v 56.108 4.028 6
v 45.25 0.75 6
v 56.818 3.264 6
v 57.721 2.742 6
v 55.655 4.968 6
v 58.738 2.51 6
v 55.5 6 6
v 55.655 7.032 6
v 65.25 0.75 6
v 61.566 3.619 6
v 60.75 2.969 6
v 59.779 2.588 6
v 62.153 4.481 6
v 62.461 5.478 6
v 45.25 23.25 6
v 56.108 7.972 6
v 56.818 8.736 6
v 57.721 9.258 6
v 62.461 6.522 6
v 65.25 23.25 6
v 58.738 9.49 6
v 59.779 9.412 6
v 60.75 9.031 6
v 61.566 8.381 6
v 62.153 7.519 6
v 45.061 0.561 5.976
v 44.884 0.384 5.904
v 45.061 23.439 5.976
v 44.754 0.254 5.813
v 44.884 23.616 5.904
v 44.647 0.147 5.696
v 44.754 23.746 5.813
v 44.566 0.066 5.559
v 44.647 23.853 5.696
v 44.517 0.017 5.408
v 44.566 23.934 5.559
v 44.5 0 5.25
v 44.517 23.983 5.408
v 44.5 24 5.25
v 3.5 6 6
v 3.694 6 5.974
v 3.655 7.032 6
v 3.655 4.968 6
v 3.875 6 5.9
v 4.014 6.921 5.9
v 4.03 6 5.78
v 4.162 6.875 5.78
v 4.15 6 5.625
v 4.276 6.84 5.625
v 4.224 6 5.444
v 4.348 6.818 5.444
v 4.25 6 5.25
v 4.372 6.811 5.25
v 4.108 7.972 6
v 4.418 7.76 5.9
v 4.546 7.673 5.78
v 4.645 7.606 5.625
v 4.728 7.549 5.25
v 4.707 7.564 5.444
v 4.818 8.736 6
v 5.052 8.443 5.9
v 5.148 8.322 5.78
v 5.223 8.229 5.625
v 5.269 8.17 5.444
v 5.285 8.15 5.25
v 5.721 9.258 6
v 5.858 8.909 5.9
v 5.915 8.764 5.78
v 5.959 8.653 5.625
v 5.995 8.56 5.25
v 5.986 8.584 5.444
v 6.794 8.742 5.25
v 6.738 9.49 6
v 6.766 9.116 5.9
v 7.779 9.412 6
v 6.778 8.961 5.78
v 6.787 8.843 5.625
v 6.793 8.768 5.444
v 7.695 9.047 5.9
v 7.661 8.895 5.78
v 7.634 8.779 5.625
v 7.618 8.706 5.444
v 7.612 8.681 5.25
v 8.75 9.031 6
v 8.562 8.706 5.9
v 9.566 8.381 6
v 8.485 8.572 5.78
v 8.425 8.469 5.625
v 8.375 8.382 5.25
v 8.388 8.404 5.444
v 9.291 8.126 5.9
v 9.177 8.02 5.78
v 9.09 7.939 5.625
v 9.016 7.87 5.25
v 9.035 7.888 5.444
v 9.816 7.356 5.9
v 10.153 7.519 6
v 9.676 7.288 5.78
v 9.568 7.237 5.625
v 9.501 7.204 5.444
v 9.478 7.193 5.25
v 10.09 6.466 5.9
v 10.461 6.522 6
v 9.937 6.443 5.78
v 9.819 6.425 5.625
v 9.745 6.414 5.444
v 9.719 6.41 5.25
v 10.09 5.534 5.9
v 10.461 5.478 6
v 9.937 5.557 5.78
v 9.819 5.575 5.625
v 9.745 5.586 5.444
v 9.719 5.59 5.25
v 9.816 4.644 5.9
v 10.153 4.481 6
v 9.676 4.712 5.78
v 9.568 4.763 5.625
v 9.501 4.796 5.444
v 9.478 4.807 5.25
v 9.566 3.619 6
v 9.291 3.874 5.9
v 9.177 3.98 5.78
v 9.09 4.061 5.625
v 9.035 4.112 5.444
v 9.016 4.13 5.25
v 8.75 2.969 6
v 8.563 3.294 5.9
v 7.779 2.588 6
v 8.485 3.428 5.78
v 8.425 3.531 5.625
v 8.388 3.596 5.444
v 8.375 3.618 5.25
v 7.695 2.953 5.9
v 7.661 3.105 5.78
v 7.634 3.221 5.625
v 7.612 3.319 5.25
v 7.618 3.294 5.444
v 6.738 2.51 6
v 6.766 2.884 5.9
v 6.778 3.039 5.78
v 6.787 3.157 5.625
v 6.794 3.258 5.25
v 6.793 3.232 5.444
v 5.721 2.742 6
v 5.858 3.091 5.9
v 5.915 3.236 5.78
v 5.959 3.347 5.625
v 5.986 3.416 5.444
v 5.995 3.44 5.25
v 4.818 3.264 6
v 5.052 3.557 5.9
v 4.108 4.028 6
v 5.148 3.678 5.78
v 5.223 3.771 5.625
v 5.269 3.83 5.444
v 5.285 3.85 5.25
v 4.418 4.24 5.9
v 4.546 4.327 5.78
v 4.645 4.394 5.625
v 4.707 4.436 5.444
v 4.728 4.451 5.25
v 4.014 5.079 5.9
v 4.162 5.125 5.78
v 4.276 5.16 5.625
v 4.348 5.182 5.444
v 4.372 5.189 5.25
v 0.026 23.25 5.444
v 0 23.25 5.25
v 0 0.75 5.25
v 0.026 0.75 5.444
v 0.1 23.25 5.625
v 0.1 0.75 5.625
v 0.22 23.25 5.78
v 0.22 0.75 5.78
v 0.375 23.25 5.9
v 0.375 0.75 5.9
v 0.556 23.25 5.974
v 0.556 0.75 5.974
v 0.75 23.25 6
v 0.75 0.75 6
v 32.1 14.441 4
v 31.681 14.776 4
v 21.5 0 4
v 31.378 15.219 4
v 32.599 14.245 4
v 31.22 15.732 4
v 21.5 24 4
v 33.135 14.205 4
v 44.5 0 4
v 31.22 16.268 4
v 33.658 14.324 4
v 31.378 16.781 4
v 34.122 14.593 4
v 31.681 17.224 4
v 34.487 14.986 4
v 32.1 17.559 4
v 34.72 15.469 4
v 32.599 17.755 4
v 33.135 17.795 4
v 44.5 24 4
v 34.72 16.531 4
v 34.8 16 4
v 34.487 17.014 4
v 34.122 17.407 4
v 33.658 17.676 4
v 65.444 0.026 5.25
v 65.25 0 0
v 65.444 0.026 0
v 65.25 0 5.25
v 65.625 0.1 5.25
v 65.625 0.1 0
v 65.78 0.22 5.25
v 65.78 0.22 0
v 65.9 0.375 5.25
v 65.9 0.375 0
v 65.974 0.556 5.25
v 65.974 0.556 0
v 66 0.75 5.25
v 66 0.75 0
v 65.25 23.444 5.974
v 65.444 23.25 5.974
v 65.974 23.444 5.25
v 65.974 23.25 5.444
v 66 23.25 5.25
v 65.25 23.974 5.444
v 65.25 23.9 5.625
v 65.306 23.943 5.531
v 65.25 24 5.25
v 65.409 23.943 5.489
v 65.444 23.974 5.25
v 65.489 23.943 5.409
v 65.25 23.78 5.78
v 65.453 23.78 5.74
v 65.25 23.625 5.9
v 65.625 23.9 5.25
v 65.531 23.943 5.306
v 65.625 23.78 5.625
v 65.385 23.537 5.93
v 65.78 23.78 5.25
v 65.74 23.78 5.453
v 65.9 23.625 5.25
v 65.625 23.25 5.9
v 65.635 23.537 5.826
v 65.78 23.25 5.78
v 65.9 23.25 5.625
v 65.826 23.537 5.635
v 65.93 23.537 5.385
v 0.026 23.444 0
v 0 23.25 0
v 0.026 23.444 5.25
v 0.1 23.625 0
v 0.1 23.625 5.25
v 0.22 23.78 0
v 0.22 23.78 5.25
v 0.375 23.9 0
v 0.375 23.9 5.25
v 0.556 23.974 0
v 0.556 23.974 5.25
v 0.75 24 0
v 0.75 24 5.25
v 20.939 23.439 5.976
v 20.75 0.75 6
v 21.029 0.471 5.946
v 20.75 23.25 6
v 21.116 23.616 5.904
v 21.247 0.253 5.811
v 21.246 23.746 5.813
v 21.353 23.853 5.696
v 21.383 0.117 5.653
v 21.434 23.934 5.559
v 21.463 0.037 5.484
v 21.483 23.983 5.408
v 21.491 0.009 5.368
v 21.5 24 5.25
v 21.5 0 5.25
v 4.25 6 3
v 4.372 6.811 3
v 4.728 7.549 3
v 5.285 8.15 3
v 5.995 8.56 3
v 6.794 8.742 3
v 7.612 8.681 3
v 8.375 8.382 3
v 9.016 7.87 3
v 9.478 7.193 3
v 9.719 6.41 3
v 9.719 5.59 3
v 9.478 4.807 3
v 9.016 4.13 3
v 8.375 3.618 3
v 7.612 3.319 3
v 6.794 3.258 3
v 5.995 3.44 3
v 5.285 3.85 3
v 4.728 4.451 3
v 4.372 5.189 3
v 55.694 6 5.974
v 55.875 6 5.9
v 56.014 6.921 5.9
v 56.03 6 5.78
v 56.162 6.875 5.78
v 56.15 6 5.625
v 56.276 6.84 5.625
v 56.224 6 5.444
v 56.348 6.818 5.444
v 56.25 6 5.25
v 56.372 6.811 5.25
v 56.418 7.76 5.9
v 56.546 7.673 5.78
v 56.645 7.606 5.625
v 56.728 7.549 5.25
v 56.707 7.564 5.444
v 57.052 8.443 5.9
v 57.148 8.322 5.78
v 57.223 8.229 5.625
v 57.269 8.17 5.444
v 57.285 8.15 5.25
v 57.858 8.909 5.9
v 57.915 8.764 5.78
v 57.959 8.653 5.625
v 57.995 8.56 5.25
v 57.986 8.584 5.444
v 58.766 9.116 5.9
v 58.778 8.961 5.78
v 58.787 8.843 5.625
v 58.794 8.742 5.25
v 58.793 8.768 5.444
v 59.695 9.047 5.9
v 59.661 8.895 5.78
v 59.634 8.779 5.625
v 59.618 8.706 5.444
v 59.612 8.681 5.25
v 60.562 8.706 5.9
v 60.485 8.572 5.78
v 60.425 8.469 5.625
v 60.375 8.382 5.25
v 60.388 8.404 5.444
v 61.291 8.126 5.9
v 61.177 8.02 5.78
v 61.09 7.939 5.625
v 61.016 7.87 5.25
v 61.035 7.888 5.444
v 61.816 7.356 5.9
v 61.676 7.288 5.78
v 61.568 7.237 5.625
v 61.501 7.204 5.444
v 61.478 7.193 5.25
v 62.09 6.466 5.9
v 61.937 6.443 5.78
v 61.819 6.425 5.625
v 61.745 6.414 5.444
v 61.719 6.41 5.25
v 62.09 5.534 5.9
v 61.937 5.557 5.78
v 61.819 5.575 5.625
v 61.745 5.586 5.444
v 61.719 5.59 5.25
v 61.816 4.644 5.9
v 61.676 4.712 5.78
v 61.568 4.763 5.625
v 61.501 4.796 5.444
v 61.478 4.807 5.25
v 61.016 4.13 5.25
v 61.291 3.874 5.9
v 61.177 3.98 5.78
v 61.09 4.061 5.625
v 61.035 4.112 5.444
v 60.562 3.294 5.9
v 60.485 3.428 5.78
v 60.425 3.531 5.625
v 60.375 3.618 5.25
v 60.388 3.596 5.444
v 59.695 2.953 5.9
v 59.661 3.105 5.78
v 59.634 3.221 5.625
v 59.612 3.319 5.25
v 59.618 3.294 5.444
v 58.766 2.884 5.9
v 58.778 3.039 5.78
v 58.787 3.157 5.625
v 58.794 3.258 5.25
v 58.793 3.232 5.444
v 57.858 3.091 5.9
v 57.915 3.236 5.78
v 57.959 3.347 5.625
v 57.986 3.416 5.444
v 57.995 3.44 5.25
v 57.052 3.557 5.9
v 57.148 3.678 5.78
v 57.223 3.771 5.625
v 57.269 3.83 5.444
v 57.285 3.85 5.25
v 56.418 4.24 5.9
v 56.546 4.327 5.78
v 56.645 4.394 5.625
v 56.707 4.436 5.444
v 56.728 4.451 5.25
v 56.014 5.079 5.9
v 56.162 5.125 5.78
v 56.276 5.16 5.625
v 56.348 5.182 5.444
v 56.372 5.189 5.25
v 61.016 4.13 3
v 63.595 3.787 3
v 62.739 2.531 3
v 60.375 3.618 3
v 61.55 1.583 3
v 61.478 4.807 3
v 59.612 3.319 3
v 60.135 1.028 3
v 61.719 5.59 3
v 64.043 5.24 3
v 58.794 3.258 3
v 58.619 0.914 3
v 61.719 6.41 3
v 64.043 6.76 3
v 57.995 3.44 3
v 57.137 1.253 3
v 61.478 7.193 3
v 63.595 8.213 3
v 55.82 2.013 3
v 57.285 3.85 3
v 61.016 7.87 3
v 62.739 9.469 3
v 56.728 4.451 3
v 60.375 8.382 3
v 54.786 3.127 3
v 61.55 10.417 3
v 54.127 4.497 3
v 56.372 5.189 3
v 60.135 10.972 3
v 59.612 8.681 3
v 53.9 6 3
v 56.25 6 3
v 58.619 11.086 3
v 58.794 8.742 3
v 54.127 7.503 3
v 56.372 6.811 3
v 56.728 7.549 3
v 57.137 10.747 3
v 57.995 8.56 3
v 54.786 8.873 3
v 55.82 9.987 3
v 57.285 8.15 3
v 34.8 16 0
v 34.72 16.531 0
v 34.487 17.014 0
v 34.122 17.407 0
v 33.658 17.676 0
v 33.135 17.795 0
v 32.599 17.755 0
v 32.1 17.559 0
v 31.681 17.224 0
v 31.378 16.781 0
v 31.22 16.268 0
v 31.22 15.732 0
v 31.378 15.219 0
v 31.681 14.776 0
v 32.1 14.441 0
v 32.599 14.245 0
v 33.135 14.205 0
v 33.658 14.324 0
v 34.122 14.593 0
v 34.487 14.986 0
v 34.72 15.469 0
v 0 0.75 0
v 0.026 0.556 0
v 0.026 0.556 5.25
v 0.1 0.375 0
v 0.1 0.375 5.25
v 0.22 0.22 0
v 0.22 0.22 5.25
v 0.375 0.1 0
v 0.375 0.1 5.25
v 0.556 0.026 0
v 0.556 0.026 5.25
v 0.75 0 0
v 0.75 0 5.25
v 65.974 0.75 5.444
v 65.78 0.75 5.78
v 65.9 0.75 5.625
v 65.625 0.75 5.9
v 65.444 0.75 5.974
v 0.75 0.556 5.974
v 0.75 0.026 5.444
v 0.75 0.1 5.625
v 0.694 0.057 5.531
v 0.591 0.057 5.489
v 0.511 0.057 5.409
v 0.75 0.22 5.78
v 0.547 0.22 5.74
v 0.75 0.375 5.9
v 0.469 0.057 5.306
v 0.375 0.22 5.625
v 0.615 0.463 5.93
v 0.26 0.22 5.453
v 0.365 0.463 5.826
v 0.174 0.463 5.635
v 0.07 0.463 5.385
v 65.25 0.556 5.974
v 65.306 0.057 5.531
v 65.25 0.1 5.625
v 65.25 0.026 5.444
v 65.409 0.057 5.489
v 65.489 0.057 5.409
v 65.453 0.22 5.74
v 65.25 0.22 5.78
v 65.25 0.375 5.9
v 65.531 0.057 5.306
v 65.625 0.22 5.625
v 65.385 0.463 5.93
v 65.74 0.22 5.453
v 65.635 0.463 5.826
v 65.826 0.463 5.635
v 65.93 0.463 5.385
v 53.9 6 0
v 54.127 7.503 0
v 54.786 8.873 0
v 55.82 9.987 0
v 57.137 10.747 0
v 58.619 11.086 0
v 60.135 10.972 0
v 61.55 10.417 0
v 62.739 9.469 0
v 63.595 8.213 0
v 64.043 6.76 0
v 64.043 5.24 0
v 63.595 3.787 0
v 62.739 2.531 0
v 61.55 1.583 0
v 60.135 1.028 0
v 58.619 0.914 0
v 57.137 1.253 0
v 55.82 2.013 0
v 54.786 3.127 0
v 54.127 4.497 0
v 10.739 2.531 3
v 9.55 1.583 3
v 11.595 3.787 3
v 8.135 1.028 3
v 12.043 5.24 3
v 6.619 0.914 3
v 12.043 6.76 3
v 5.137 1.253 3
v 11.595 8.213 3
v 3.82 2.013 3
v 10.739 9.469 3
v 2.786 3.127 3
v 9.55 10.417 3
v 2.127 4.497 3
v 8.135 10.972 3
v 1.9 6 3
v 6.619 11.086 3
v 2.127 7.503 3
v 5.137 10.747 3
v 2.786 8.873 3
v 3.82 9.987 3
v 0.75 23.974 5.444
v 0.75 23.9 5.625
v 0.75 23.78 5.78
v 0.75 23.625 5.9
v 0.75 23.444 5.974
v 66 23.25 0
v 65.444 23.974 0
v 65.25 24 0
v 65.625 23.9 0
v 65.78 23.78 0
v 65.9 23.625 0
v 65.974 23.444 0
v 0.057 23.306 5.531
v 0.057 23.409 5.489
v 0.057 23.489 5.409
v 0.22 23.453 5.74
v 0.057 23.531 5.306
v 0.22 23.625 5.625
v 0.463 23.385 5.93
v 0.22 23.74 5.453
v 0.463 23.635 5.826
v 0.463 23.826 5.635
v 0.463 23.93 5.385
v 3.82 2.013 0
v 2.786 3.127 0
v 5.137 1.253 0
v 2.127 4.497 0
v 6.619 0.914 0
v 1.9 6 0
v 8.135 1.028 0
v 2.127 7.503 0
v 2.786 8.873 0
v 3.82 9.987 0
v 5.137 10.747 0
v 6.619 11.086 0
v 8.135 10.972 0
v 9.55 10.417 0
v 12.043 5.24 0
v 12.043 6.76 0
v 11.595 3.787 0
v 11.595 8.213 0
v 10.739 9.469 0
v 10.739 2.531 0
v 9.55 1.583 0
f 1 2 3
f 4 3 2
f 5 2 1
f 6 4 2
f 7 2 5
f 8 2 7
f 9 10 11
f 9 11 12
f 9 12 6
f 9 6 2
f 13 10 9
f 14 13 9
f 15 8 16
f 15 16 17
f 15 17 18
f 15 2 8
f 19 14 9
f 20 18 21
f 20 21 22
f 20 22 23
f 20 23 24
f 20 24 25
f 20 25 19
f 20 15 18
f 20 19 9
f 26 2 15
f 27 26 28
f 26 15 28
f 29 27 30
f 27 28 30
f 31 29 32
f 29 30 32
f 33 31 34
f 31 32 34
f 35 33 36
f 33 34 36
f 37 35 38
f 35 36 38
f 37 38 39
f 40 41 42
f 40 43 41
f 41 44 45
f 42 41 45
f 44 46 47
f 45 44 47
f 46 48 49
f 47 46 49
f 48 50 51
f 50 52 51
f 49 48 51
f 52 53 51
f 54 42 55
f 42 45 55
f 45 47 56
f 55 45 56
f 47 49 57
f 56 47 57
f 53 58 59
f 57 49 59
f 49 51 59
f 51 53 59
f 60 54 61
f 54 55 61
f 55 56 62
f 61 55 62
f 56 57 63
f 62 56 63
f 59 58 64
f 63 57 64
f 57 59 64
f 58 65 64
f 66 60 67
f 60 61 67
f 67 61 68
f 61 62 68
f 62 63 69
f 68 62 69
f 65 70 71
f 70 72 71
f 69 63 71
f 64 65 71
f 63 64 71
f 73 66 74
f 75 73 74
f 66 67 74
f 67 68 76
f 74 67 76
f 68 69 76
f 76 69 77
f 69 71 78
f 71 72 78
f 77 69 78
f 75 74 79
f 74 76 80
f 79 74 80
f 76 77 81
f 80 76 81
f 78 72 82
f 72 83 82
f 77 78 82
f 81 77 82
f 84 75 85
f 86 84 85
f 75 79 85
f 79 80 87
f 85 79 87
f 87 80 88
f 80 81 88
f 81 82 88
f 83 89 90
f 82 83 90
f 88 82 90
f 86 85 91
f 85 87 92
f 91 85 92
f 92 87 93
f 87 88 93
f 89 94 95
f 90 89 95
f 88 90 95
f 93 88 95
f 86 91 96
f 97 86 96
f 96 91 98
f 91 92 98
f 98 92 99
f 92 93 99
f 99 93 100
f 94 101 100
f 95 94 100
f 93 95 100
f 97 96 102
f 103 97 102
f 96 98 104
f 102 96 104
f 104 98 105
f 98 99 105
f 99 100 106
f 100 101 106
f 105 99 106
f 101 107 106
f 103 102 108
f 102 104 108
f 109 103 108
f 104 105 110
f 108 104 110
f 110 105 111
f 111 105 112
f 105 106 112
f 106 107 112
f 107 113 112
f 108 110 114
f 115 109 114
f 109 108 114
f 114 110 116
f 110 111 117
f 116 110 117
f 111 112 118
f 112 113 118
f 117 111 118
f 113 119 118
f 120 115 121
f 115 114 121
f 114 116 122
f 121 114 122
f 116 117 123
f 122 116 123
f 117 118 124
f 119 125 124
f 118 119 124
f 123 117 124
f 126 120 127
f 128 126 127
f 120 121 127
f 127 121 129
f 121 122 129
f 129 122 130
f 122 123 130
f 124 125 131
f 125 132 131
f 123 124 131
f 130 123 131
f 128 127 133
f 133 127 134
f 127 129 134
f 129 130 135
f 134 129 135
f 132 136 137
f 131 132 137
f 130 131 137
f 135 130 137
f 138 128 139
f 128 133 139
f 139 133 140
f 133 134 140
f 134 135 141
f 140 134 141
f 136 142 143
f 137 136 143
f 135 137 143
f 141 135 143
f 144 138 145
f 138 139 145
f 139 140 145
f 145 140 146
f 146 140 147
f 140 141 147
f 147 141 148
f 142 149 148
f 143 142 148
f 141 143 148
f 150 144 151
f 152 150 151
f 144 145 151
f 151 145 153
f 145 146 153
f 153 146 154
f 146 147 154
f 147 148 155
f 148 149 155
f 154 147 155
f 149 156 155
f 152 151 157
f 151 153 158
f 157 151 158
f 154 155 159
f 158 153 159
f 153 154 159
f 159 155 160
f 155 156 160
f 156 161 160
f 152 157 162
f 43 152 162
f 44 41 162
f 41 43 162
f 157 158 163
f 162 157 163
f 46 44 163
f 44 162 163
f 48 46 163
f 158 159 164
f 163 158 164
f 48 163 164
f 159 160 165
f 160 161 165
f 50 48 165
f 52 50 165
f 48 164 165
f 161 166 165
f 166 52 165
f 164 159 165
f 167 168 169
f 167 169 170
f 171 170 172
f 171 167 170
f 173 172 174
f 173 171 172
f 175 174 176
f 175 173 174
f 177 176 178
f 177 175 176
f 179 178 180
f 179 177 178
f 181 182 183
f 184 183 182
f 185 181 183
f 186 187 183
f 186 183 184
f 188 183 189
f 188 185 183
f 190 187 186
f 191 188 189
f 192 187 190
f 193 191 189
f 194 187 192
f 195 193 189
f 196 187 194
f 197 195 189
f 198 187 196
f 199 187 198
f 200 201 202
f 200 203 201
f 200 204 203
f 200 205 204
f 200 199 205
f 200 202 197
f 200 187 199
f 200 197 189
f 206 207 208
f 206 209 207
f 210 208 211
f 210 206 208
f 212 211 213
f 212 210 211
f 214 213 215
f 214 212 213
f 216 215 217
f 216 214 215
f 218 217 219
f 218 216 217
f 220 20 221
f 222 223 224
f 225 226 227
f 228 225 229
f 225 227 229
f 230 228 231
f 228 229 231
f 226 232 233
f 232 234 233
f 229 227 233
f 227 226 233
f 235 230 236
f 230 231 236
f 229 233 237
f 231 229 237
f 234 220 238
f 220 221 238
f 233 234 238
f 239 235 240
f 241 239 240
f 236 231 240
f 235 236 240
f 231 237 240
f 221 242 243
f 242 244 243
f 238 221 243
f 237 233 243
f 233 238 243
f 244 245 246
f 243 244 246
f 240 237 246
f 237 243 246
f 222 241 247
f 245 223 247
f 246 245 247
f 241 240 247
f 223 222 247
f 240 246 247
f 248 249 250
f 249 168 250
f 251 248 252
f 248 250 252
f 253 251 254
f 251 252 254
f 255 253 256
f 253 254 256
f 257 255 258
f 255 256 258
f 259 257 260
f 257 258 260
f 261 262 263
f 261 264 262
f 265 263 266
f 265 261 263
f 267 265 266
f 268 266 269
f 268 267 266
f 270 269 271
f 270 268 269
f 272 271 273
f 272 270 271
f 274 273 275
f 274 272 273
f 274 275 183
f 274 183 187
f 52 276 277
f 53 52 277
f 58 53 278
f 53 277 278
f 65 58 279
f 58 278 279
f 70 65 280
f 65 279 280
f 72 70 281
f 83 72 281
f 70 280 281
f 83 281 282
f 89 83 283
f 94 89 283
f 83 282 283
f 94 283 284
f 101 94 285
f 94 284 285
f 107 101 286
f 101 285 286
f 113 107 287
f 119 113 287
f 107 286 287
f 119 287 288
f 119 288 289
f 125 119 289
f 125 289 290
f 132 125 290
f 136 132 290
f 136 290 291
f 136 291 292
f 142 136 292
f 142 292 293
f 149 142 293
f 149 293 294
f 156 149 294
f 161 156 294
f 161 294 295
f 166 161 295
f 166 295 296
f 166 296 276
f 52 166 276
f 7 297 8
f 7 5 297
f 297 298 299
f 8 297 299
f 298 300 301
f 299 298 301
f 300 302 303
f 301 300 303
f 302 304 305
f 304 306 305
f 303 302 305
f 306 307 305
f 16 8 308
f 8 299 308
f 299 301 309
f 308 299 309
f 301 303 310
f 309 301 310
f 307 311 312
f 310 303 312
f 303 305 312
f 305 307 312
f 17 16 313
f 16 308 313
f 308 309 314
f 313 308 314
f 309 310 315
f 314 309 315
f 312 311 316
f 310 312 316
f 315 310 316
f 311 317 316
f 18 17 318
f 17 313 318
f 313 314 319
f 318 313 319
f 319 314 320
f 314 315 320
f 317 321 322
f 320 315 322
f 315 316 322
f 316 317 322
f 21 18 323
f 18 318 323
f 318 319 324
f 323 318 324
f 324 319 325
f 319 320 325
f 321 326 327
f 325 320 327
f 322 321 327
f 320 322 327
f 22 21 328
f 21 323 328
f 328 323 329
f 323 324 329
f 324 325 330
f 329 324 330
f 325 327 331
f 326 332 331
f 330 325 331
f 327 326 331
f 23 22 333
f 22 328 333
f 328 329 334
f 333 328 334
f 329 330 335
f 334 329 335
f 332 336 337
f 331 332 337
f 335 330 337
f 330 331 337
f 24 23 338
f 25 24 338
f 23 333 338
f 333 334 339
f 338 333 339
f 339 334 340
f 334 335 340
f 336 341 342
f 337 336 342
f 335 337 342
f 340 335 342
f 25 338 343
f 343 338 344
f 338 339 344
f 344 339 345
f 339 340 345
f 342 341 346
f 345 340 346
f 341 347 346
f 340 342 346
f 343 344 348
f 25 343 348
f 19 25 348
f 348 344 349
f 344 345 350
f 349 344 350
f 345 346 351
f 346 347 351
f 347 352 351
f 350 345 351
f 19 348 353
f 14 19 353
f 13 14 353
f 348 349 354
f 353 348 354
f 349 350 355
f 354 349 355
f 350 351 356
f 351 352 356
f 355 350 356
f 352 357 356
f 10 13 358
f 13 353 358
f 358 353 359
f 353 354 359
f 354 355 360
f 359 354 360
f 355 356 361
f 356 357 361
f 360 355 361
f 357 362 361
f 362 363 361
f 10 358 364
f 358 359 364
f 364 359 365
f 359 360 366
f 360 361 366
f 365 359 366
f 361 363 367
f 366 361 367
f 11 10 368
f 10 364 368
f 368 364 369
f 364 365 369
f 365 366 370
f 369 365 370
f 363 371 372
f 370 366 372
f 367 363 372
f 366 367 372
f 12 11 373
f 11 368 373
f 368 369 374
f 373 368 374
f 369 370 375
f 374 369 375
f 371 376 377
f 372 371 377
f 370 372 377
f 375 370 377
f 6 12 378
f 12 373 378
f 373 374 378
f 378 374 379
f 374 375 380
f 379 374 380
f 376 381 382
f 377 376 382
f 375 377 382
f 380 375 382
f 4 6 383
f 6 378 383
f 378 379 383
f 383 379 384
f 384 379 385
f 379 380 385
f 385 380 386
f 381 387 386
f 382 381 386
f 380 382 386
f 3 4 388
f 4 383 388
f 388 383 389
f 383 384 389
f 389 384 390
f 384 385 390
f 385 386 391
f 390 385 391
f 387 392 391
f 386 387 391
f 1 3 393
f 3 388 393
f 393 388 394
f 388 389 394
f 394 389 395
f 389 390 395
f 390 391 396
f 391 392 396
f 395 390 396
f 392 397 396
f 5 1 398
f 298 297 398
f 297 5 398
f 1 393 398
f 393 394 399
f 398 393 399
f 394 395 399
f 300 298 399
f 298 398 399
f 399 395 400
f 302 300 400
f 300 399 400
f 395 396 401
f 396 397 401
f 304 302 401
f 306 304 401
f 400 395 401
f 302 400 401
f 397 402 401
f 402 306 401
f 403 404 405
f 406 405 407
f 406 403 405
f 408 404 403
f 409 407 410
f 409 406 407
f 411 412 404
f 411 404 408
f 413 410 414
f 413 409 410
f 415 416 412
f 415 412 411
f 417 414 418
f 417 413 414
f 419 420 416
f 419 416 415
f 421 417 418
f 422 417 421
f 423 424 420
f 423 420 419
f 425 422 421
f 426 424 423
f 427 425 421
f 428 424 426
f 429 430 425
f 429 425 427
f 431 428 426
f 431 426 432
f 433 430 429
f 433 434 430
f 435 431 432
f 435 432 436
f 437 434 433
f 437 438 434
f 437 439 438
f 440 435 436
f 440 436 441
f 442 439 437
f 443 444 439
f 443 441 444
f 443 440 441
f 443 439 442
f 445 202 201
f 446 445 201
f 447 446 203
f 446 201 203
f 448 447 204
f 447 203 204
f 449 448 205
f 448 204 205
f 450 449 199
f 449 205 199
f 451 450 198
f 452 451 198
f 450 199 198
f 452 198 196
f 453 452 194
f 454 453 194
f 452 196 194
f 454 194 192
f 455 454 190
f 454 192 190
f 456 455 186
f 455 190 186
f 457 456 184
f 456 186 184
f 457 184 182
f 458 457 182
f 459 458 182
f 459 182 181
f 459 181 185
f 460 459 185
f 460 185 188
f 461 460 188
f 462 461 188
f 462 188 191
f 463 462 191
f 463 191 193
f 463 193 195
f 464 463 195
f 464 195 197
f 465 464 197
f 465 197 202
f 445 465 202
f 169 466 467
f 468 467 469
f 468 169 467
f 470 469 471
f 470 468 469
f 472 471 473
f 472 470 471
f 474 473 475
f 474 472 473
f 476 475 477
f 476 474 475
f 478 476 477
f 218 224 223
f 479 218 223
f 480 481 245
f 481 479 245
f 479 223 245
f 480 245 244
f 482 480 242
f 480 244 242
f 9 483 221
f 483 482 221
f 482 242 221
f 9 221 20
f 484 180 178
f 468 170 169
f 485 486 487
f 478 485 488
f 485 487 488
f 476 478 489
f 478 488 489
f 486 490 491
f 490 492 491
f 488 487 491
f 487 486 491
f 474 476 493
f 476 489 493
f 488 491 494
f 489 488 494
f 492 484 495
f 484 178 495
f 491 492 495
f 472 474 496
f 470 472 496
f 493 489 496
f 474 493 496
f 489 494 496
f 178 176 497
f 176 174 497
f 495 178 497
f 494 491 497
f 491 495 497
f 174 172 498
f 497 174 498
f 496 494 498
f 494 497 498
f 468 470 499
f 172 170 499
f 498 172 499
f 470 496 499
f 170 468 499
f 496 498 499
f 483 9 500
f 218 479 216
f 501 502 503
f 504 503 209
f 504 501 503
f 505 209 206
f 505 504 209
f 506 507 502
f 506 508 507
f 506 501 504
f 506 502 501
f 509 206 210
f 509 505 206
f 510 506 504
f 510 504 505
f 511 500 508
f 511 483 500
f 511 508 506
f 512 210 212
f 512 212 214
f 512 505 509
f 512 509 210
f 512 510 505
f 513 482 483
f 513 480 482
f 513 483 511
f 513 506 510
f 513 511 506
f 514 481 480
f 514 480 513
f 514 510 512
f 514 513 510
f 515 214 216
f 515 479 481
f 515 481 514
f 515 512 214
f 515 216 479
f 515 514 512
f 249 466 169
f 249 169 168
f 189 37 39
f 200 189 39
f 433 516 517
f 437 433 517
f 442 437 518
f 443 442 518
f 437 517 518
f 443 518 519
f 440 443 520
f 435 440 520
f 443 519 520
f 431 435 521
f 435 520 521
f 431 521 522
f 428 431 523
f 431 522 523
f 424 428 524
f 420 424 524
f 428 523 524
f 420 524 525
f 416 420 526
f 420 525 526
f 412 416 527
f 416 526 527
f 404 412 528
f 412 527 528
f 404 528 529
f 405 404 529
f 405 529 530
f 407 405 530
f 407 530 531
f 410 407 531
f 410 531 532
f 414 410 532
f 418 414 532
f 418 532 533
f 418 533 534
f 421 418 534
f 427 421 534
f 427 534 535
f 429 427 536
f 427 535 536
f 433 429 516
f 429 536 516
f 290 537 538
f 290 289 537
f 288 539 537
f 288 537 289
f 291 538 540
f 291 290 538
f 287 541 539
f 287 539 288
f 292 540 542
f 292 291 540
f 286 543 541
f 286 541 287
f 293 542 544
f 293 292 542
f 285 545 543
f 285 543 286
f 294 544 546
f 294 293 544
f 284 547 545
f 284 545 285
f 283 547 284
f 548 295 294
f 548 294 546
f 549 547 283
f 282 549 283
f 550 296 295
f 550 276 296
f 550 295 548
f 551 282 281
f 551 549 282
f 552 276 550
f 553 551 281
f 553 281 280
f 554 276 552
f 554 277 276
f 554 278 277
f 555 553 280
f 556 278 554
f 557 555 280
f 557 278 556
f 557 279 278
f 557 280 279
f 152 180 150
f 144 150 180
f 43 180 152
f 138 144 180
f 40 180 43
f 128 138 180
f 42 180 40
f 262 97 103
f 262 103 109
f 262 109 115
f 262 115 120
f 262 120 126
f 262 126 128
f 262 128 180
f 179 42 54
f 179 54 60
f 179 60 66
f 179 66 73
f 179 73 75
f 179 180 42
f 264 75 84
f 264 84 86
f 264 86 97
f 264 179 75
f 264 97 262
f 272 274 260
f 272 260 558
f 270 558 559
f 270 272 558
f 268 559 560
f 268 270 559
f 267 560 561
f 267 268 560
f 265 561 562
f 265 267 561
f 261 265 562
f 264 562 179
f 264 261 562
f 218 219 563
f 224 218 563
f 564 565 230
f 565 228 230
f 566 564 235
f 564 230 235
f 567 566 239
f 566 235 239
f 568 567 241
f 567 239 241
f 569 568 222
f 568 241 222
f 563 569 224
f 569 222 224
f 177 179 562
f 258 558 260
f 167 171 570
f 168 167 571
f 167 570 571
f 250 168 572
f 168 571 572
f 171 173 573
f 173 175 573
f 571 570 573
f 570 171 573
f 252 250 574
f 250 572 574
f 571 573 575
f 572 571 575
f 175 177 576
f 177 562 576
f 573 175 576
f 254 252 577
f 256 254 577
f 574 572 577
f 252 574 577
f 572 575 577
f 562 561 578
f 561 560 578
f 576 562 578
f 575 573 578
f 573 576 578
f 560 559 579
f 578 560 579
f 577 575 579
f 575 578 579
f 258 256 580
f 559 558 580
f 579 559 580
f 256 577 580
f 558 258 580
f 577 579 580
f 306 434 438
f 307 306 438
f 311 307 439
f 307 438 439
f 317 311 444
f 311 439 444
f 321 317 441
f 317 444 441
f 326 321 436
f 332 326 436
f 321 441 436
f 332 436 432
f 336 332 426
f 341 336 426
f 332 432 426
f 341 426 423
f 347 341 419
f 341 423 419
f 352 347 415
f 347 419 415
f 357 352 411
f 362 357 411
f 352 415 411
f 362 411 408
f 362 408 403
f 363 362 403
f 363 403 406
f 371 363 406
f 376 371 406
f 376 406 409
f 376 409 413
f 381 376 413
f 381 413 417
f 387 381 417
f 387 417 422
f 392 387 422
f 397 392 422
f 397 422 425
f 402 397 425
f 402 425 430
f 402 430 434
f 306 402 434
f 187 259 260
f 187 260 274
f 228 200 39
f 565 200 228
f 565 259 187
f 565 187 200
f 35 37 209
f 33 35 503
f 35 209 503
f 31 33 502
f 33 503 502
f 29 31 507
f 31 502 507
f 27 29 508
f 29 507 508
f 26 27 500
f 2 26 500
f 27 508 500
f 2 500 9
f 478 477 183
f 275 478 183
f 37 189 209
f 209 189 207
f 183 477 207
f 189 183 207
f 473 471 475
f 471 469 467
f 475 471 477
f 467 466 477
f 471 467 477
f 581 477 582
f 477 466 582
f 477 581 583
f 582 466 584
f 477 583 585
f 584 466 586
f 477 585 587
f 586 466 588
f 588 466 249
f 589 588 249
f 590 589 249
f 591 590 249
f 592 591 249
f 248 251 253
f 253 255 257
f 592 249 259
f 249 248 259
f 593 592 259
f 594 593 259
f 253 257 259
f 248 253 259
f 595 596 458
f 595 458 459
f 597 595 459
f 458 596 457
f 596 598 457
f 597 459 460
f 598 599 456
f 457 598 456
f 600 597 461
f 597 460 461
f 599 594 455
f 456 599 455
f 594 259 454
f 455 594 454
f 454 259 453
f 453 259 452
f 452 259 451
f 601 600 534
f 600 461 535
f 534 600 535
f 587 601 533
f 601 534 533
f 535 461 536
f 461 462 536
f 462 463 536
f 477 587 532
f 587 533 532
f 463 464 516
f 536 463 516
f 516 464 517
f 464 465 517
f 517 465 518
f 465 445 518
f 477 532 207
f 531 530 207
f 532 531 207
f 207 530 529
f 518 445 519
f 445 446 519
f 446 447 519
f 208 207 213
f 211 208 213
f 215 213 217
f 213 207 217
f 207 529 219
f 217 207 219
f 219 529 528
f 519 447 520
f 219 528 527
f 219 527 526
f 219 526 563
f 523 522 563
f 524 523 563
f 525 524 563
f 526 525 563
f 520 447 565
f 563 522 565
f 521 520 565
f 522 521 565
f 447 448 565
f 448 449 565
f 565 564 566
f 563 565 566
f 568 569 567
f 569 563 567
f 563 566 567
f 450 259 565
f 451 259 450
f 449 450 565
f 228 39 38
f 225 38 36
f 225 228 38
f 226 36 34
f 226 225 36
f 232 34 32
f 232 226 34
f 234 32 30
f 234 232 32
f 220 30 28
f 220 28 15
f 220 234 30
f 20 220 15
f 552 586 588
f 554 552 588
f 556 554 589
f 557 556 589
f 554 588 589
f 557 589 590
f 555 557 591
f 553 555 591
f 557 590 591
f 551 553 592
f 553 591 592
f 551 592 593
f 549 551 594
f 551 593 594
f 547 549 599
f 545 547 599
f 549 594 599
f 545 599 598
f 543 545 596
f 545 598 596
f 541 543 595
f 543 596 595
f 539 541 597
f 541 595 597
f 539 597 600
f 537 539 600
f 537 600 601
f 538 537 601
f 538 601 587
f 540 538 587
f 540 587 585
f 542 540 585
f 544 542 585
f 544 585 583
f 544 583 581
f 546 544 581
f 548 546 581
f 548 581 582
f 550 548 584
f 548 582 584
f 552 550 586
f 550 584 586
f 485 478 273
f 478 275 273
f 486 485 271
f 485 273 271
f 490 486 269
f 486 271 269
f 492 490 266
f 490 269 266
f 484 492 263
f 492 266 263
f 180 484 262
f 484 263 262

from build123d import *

# Parameters (mm, degrees)
ESQUISSE2_W             = 66
ESQUISSE2_H             = 24
BOSS_EXTRU_1_DEPTH      = 6
ESQUISSE3_W             = 23
ESQUISSE3_H             = 24
ENL_V_MAT_EXTRU_1_DEPTH = 2
ESQUISSE4_R             = 1.8
ENL_V_MAT_EXTRU_2_DEPTH = 5
ESQUISSE5_R             = 2.75
ENL_V_MAT_EXTRU_3_DEPTH = 7
ESQUISSE6_R             = 5.1
ENL_V_MAT_EXTRU_4_DEPTH = 3
CONG_1_R                = 0.75


with BuildPart() as part:
    # Esquisse2 → Boss.-Extru.1 (new body)
    with BuildSketch(Plane.XY):
        with Locations((33, 12)):
            Rectangle(ESQUISSE2_W, ESQUISSE2_H)
    extrude(amount=BOSS_EXTRU_1_DEPTH)

    # Esquisse3 → Enlèv. mat.-Extru.1 (cut)
    with BuildSketch(Plane.XY.offset(6)):
        with Locations((33, 12)):
            Rectangle(ESQUISSE3_W, ESQUISSE3_H)
    extrude(amount=-ENL_V_MAT_EXTRU_1_DEPTH, mode=Mode.SUBTRACT)

    # Esquisse4 → Enlèv. mat.-Extru.2 (cut, through all)
    with BuildSketch(Plane.XY.offset(4)):
        with Locations((33, 16)):
            Circle(ESQUISSE4_R)
    extrude(amount=-ENL_V_MAT_EXTRU_2_DEPTH, mode=Mode.SUBTRACT)

    # Esquisse5 → Enlèv. mat.-Extru.3 (cut, through all)
    with BuildSketch(Plane(origin=(0, 0, 0), x_dir=(-1, 0, 0), z_dir=(0, 0, -1))):
        with Locations((-59, 6)):
            Circle(ESQUISSE5_R)
        with Locations((-7, 6)):
            Circle(ESQUISSE5_R)
    extrude(amount=-ENL_V_MAT_EXTRU_3_DEPTH, mode=Mode.SUBTRACT)

    # Esquisse6 → Enlèv. mat.-Extru.4 (cut)
    with BuildSketch(Plane(origin=(0, 0, 0), x_dir=(-1, 0, 0), z_dir=(0, 0, -1))):
        with Locations((-59, 6)):
            Circle(ESQUISSE6_R)
        with Locations((-7, 6)):
            Circle(ESQUISSE6_R)
    extrude(amount=-ENL_V_MAT_EXTRU_4_DEPTH, mode=Mode.SUBTRACT)

    # Congé1
    cong_1_edges = [part.edges().sort_by_distance(p)[0] for p in [
        (66, 12, 6),
        (55.25, 24, 6),
        (55.25, 0, 6),
        (10.75, 24, 6),
        (21.5, 12, 6),
        (44.5, 12, 6),
        (61.75, 6, 6),
        (9.75, 6, 6),
        (0, 12, 6),
        (10.75, 0, 6),
        (0, 24, 3),
        (66, 24, 3),
        (66, 0, 3),
        (0, 0, 3),
    ]]
    fillet(cong_1_edges, radius=CONG_1_R)


solid = part.part
